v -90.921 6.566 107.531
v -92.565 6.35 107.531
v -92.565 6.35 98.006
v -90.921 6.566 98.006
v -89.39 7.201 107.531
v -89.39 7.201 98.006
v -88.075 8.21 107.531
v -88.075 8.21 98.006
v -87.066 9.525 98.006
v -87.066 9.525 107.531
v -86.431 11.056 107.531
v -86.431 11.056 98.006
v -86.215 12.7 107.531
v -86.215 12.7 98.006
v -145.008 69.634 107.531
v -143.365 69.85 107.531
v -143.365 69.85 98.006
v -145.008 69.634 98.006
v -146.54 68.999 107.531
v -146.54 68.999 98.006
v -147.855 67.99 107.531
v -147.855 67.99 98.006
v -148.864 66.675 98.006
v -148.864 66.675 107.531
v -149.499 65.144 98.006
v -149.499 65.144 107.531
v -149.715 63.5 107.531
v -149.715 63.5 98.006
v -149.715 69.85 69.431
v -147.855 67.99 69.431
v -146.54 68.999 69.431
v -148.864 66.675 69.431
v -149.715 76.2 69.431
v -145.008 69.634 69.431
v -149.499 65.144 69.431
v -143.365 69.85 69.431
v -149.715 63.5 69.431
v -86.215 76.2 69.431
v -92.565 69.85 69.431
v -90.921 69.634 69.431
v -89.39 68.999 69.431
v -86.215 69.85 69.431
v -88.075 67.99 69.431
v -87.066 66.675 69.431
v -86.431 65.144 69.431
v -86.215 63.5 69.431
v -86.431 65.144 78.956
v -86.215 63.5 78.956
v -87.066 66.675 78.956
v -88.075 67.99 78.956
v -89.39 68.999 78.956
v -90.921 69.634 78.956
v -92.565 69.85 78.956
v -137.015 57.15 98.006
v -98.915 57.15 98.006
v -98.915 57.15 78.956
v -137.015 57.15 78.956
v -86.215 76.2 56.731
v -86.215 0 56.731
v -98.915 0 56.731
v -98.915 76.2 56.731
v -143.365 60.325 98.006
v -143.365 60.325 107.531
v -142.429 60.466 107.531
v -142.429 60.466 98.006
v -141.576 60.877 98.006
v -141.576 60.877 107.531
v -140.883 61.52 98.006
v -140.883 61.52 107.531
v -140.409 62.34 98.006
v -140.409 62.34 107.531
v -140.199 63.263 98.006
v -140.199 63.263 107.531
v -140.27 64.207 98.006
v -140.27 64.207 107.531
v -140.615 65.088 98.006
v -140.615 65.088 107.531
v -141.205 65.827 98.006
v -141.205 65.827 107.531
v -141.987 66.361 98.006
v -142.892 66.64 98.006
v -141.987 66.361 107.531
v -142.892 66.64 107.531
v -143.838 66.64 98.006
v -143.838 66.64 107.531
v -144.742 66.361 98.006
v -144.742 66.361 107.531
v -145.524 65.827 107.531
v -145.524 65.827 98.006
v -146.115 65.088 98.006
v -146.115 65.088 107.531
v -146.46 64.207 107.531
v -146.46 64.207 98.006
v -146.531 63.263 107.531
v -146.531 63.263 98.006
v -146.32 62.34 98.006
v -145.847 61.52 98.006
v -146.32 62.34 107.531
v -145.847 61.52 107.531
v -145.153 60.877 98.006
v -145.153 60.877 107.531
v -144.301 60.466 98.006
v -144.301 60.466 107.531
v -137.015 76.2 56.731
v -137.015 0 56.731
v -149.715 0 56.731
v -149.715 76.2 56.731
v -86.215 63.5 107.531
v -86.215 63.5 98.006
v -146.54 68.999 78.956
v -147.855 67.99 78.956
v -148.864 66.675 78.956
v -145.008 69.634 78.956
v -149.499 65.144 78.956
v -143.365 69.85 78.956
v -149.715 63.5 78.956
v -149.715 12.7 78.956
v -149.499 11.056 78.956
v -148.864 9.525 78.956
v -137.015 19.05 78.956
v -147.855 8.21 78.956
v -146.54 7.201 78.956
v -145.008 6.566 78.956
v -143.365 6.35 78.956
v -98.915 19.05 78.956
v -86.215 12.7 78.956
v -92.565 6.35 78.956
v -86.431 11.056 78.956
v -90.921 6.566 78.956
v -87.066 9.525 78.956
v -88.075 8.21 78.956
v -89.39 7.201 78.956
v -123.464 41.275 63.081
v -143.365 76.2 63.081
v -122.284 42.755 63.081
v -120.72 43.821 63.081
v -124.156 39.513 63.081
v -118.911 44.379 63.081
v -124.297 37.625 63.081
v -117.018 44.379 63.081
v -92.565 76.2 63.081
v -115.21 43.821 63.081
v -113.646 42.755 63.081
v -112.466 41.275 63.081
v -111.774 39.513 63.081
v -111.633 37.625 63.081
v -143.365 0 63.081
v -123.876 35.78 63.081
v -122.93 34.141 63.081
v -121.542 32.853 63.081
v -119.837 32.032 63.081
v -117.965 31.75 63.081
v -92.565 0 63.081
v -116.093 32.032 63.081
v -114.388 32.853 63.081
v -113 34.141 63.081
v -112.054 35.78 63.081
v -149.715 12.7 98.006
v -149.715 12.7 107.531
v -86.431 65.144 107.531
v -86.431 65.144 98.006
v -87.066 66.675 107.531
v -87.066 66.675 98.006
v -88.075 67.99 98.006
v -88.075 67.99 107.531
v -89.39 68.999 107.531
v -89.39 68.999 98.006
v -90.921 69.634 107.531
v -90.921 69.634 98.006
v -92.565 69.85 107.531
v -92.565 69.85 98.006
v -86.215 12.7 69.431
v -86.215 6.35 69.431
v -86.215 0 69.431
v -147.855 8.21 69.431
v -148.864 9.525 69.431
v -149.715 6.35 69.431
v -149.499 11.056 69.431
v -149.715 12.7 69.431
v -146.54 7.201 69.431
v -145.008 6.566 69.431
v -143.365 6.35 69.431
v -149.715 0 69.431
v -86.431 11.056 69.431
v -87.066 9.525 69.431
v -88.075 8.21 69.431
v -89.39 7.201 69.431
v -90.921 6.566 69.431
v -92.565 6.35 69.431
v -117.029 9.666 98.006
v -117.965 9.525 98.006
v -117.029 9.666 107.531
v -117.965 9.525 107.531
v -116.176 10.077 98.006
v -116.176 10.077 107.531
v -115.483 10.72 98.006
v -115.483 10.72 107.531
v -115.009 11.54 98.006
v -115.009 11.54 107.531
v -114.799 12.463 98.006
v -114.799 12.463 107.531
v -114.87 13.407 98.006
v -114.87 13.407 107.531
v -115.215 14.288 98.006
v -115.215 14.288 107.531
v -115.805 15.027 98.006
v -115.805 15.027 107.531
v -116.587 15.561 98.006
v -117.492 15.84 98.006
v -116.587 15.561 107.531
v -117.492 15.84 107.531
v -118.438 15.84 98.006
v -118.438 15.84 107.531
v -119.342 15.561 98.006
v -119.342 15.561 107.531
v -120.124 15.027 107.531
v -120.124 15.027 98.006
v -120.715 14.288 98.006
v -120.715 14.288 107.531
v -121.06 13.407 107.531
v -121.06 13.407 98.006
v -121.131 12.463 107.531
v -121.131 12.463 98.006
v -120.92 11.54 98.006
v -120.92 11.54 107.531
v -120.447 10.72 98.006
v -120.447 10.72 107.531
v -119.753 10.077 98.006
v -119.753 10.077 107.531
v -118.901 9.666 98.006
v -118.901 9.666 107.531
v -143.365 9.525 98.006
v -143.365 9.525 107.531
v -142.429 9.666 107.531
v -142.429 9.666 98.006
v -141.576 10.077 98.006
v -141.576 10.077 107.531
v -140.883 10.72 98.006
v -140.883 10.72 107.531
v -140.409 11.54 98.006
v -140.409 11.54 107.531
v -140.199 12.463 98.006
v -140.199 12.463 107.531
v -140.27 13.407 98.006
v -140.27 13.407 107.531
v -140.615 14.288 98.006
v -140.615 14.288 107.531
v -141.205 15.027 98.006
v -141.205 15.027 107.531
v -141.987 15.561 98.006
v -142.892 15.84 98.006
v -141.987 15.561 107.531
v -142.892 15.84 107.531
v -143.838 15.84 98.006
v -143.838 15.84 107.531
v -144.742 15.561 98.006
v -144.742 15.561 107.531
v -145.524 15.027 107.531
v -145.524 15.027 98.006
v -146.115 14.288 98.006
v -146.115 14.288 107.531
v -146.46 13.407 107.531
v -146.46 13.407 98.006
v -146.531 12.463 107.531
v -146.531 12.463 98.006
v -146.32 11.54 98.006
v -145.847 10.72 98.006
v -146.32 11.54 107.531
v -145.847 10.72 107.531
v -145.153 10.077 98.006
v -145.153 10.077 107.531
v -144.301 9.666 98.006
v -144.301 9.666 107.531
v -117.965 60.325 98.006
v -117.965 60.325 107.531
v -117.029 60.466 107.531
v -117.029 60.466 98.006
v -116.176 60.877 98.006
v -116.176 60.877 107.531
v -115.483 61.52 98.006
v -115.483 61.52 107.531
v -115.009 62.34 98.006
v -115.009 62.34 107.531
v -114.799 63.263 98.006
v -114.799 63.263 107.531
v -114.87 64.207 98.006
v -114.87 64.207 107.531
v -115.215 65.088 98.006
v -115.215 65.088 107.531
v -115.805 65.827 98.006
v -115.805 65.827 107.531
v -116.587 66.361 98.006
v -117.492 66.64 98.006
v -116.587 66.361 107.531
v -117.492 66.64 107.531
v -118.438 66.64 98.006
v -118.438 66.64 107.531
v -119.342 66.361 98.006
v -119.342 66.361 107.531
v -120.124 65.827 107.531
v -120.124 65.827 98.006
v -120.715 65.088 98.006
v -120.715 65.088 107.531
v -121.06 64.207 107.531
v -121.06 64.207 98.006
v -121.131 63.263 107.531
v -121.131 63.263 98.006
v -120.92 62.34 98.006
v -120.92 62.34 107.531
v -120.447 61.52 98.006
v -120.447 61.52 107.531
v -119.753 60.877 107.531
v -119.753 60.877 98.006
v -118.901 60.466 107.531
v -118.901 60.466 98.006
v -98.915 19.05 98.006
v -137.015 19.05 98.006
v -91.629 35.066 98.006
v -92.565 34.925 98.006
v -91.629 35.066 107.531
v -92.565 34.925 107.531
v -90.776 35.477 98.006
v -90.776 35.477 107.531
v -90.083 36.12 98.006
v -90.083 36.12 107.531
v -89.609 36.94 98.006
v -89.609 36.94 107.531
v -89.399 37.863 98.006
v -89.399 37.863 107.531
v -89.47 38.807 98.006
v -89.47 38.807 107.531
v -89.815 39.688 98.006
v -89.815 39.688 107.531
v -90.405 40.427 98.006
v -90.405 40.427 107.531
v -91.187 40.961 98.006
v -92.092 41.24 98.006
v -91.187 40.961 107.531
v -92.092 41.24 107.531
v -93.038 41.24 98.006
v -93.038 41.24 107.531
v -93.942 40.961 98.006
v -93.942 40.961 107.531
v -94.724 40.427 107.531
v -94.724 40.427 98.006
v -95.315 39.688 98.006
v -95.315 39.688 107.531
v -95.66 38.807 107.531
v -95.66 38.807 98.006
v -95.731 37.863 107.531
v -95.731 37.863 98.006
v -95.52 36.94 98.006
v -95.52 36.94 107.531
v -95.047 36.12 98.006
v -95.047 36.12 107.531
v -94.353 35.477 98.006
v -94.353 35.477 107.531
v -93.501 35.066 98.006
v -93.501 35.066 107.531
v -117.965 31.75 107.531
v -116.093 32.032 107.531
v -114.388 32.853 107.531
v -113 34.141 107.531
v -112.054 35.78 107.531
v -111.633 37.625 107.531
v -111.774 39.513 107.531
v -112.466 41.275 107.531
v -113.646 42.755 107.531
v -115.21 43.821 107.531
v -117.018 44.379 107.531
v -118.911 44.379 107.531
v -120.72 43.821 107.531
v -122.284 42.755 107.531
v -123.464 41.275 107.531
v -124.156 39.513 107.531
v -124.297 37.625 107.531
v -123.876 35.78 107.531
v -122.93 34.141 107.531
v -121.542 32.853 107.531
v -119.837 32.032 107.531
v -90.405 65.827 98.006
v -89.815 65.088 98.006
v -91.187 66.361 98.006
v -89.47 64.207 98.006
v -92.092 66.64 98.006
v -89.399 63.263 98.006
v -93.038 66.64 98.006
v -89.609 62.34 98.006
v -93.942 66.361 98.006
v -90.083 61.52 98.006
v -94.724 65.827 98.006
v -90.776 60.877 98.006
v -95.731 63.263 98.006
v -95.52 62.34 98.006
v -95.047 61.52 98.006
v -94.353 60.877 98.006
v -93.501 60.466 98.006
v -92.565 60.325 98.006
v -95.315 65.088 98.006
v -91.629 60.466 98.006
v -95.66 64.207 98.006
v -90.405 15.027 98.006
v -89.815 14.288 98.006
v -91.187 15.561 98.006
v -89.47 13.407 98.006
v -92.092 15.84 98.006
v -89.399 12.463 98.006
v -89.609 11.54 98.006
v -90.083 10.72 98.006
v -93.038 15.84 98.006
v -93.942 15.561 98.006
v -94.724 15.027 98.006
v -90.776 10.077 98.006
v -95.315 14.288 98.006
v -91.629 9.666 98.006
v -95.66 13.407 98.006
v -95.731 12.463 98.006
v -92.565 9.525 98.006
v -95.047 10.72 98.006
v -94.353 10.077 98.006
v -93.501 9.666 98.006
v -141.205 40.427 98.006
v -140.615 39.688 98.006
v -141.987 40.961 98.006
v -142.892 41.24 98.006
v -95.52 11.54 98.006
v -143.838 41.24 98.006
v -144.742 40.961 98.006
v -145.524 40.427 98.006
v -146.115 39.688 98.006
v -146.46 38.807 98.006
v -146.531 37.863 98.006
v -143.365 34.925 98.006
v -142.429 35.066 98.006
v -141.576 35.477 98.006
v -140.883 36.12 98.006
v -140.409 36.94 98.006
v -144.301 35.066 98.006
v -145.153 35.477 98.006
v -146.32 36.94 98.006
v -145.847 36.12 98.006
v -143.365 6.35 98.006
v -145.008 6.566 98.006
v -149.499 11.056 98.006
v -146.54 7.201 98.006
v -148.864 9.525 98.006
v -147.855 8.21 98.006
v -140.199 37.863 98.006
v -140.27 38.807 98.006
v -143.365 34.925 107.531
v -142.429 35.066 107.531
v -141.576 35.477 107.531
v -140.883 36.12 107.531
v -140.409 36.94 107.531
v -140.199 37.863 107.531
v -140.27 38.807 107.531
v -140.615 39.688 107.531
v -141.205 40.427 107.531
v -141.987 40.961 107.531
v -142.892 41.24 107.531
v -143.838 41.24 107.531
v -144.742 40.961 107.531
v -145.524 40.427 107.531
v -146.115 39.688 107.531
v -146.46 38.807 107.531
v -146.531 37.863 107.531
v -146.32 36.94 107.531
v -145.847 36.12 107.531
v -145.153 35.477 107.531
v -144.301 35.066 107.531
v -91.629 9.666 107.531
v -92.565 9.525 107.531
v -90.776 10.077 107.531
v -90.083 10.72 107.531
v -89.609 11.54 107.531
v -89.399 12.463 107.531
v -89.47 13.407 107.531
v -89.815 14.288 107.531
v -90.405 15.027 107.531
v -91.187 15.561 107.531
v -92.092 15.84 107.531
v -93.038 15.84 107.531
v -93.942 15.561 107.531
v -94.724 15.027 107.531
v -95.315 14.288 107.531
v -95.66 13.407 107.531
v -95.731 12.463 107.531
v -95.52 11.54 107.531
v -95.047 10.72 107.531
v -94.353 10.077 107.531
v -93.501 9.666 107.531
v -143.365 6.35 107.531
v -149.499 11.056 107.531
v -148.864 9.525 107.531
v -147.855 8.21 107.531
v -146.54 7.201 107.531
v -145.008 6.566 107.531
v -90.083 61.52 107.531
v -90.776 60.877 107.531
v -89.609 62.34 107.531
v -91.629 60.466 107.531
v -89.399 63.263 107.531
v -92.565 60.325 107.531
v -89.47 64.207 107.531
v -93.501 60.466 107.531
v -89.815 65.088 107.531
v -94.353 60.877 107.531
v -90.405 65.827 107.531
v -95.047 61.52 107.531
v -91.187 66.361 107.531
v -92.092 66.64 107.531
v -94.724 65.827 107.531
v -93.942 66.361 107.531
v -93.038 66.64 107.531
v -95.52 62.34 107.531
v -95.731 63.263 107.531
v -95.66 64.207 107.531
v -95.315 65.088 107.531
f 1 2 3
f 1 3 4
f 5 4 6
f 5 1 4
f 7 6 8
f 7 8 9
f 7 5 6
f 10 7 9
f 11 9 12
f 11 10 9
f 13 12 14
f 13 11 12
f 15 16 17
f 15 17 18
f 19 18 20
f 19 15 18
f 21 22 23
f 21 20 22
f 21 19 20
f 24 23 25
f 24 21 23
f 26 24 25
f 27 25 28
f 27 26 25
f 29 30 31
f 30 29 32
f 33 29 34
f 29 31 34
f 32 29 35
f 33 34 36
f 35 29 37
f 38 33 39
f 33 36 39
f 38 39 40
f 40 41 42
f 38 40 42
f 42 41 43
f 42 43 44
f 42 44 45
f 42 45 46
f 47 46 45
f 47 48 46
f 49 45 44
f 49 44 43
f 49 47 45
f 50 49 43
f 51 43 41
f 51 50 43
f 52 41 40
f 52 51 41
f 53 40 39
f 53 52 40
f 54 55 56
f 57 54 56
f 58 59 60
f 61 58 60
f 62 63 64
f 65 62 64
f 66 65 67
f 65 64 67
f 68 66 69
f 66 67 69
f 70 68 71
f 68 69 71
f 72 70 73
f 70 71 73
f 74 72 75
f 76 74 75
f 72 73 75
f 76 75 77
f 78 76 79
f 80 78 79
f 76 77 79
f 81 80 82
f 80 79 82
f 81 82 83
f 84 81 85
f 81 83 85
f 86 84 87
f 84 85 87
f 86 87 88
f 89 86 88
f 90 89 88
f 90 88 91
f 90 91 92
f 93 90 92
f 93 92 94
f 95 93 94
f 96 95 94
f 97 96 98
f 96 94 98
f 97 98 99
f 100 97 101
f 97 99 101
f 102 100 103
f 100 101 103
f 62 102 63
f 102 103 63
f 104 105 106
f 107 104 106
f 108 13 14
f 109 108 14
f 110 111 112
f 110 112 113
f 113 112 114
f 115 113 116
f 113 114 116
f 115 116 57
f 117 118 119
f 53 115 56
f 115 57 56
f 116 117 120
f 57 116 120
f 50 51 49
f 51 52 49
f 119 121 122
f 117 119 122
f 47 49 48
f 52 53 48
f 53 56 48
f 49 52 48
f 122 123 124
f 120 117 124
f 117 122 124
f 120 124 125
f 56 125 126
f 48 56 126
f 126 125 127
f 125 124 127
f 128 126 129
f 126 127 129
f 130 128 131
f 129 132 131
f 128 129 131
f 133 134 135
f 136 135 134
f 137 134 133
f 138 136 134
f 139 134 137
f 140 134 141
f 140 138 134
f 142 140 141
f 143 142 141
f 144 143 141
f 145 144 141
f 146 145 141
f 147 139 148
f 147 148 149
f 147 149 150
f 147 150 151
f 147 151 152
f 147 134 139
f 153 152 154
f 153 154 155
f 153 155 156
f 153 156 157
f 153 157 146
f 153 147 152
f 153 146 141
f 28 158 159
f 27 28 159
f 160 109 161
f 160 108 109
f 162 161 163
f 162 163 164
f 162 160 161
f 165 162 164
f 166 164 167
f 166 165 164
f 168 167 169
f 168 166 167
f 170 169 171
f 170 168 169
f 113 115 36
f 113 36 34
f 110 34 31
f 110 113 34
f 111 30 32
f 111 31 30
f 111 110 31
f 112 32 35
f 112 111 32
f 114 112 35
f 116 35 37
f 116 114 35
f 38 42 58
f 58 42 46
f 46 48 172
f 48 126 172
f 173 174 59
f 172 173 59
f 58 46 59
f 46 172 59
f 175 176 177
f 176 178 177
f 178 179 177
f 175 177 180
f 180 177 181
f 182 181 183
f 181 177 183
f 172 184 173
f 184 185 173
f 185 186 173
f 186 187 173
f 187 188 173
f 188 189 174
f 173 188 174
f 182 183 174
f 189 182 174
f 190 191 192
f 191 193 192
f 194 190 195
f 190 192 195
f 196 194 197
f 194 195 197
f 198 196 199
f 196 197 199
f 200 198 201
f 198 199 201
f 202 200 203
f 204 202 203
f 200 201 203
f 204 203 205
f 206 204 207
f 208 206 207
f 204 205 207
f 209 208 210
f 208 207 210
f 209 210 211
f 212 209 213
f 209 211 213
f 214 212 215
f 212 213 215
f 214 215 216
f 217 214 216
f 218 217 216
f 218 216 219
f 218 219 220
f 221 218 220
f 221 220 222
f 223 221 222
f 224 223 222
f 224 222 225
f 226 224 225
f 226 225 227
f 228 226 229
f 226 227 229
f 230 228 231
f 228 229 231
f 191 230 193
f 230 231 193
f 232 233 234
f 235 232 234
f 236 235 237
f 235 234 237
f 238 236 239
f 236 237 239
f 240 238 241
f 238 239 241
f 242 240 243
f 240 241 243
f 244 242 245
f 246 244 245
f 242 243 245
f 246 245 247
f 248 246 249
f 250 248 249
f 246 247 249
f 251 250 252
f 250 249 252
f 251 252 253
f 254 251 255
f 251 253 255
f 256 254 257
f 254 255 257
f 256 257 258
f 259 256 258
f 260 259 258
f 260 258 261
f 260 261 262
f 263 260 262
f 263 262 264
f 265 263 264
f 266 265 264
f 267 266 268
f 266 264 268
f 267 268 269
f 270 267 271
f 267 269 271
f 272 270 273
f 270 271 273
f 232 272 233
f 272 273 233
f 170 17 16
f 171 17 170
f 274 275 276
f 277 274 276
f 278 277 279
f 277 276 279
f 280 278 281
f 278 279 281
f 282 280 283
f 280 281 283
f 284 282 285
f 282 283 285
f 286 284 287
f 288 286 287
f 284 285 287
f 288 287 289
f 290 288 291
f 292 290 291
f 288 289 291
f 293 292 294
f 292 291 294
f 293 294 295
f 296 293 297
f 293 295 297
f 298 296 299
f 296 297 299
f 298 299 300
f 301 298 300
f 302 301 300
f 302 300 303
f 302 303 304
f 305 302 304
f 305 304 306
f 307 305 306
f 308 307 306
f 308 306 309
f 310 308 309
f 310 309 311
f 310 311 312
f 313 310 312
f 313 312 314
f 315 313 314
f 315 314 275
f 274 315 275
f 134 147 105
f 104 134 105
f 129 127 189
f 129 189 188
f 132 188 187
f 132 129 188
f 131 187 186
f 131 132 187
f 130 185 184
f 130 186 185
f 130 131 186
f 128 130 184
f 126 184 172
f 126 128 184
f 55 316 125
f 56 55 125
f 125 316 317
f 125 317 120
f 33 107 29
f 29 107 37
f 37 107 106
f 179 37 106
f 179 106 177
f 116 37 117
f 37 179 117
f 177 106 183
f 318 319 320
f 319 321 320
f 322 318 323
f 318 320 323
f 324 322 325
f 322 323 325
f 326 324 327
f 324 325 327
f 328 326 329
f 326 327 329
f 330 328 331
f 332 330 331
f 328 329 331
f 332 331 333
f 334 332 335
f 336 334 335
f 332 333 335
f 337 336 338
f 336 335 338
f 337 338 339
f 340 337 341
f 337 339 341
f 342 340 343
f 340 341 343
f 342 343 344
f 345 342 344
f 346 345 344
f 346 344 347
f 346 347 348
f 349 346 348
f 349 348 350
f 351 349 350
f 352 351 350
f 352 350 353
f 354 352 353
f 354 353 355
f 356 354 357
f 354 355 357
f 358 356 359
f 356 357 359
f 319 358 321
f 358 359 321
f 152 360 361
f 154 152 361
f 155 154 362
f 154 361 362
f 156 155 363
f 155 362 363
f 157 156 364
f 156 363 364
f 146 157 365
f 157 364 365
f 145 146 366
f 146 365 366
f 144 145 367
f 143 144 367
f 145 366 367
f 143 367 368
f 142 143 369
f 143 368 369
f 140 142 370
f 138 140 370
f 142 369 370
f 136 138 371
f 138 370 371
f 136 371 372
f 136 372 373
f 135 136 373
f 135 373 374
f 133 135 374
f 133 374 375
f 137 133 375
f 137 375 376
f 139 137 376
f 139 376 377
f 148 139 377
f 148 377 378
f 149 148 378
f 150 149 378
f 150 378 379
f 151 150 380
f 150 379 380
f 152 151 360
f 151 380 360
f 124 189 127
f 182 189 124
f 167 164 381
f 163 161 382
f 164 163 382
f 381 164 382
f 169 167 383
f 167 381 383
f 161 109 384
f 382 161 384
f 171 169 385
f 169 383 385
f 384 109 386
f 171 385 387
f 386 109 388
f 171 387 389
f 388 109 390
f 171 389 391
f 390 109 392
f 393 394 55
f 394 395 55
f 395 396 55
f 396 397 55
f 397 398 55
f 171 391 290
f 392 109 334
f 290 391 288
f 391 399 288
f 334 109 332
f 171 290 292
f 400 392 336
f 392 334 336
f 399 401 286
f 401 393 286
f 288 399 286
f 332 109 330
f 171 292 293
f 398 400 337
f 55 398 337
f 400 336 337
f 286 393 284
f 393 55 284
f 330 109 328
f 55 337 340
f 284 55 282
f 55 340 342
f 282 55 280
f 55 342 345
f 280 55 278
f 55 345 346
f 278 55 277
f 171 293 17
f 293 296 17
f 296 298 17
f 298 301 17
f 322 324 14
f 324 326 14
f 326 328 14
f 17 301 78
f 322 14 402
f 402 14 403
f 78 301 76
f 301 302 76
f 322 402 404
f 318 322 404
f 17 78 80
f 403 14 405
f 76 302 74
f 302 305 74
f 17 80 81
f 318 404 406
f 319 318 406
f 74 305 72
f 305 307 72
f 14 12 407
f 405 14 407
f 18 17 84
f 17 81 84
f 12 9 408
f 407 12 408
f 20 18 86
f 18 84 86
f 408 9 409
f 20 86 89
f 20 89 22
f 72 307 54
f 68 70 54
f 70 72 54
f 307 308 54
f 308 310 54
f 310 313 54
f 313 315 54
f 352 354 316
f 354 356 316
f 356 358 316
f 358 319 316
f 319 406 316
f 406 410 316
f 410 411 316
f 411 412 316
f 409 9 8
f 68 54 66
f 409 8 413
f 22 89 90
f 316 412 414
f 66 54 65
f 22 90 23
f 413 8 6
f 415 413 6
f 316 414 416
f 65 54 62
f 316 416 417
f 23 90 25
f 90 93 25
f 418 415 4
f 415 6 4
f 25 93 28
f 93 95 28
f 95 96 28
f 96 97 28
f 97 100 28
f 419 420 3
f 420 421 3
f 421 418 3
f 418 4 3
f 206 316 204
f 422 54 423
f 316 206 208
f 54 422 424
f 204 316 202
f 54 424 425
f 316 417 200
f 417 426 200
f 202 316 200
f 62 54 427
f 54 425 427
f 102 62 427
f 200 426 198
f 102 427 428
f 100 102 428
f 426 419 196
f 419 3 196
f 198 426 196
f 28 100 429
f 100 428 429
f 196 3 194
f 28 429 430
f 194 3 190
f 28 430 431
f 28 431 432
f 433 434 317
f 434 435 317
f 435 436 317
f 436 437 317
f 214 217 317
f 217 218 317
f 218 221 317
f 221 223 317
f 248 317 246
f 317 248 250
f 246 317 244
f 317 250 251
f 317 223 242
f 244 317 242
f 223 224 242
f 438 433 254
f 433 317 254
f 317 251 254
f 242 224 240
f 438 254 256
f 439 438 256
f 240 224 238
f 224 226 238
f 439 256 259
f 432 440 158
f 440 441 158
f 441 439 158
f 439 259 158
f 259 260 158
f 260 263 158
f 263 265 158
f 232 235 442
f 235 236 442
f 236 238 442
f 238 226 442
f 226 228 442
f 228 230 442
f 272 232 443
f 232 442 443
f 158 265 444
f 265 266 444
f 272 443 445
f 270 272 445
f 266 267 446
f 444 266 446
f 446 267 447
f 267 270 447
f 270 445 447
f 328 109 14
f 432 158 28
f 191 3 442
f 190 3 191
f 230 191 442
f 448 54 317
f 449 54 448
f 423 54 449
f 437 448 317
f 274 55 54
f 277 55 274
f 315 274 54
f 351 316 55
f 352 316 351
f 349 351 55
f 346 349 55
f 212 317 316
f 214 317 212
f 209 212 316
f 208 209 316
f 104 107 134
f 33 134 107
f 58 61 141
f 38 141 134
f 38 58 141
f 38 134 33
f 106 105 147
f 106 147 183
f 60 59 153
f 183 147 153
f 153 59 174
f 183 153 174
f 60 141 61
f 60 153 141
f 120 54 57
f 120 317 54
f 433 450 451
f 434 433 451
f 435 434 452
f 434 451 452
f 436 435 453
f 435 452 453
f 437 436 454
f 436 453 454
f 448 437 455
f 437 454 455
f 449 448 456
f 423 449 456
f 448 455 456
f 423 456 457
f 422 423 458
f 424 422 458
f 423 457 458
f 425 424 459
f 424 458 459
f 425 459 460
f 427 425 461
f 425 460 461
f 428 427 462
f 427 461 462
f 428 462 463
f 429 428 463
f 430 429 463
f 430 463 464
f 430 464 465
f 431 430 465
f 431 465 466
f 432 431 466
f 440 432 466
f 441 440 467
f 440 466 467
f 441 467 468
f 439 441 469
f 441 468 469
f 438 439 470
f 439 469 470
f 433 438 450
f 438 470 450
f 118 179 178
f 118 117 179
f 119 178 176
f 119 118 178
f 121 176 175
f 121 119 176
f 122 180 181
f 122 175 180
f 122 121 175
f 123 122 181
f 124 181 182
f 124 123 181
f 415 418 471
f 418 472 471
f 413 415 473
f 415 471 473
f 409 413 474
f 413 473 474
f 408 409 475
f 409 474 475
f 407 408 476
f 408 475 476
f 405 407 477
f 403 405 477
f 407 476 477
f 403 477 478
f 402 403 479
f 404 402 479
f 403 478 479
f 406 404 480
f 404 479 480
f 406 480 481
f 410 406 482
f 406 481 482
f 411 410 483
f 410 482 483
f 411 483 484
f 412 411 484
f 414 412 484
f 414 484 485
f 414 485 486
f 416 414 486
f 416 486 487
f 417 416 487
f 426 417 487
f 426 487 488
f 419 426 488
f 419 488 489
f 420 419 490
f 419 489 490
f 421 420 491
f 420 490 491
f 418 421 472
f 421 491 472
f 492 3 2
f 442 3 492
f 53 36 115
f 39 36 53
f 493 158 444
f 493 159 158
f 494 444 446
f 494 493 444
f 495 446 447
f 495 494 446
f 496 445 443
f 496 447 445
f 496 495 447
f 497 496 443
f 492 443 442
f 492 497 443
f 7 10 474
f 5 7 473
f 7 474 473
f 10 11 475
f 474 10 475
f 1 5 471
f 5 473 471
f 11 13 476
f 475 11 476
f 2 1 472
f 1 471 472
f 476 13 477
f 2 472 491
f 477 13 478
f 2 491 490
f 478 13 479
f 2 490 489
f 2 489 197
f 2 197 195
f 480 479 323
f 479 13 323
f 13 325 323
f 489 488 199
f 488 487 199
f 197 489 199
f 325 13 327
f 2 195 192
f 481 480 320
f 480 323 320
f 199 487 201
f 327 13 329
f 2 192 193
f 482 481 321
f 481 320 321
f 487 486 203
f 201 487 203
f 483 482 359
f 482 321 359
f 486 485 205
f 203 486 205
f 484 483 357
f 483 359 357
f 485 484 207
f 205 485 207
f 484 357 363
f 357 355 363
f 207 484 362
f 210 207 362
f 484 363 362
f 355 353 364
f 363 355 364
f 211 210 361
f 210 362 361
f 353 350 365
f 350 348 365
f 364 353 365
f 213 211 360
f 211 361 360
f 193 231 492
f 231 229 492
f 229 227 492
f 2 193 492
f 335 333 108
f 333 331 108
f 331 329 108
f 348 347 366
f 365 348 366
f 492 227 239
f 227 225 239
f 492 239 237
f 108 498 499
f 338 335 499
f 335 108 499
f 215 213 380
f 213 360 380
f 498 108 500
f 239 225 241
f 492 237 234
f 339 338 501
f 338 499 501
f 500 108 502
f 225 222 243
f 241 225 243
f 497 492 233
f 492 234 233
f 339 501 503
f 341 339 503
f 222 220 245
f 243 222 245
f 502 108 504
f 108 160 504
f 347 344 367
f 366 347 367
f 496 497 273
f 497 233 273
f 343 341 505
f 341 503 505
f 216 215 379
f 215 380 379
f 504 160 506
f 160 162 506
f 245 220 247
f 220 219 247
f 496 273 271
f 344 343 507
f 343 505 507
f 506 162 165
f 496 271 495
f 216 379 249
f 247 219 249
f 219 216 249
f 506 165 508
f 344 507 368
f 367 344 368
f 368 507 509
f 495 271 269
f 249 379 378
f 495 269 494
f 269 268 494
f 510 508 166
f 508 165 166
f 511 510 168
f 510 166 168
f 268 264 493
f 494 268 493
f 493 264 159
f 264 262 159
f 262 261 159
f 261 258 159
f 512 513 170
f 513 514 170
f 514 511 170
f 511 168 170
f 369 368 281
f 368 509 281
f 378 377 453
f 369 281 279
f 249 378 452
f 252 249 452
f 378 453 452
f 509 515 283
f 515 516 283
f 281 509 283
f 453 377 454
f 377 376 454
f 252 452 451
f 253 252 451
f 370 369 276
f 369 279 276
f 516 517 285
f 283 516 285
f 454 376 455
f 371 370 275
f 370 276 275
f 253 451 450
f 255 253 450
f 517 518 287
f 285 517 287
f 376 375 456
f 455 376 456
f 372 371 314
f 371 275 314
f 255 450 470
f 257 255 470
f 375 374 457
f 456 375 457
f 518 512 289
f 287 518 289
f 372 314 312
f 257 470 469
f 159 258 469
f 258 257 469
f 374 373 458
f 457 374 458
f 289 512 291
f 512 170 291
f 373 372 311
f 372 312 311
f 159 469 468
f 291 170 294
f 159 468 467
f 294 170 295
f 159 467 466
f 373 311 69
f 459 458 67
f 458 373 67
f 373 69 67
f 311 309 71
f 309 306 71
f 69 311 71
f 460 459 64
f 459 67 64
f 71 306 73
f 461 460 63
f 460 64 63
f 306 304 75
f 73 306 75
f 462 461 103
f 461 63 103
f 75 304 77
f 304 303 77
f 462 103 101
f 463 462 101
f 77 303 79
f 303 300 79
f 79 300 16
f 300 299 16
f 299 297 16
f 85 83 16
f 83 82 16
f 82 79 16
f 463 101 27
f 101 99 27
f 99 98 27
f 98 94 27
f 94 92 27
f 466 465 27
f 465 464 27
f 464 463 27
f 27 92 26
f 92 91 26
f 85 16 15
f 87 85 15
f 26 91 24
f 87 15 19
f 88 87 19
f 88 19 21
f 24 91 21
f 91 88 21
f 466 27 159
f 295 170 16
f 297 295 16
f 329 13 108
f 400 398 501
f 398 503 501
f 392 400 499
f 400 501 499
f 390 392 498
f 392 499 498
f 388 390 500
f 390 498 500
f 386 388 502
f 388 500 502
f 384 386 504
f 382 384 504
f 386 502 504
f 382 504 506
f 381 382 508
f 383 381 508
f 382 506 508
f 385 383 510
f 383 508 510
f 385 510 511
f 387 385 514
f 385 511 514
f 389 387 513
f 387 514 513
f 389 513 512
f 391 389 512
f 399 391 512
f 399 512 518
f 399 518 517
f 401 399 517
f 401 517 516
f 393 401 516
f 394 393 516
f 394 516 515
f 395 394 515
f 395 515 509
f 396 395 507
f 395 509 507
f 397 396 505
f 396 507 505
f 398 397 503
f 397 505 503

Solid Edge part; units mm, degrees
sketch "Sketch1" plane through (0, 0, 0) normal (0, -1, 0) x (1, 0, 0)
  line L0 (-149.7149, 69.4306) -> (-86.2149, 69.4306)
  line L1 (-86.2149, 69.4306) -> (-86.2149, 56.7306)
  line L2 (-86.2149, 56.7306) -> (-98.9149, 56.7306)
  line L3 (-92.5649, 63.0806) -> (-98.9149, 56.7306)
  line L4 (-143.3649, 63.0806) -> (-92.5649, 63.0806)
  line L5 (-143.3649, 63.0806) -> (-137.0149, 56.7306)
  line L6 (-137.0149, 56.7306) -> (-149.7149, 56.7306)
  line L7 (-149.7149, 56.7306) -> (-149.7149, 69.4306)
extrude "Protrusion1" add sketch "Sketch1" against normal blind 76.2
sketch "Sketch2" plane through (-117.9649, 38.1, 69.4306) normal (0, 0, 1) x (1, 0, 0)
  line L0 (31.75, -31.75) -> (-31.75, -31.75)
  line L1 (-31.75, -31.75) -> (-31.75, 31.75)
  line L2 (-31.75, 31.75) -> (31.75, 31.75)
  line L3 (31.75, 31.75) -> (31.75, -31.75)
extrude "ExtrudedProtrusion_2" add sketch "Sketch2" along normal blind 38.1
sketch "Sketch3" plane through (-117.9649, 6.35, 88.4806) normal (0, -1, 0) x (1, 0, 0)
  line L0 (-31.75, -9.525) -> (-19.05, -9.525)
  line L1 (-19.05, 9.525) -> (-19.05, -9.525)
  line L2 (-31.75, 9.525) -> (-19.05, 9.525)
extrude "Cutout1" cut sketch "Sketch3" against normal through all material side at (-143.3649, 6.35, 79.0056)
sketch "Sketch4" plane through (-117.9649, 6.35, 88.4806) normal (0, -1, 0) x (1, 0, 0)
  line L0 (19.05, -9.525) -> (31.75, -9.525)
  line L1 (19.05, 9.525) -> (19.05, -9.525)
  line L2 (31.75, 9.525) -> (19.05, 9.525)
extrude "Cutout2" cut sketch "Sketch4" against normal through all material side at (-92.5649, 6.35, 79.0056)
sketch "Sketch5" plane through (-98.9149, 38.1, 88.4806) normal (1, 0, 0) x (0, 0, -1)
  line L0 (-9.525, 19.05) -> (9.525, 19.05)
  line L1 (9.525, 19.05) -> (9.525, 31.75)
  line L2 (9.525, 31.75) -> (-9.525, 31.75)
  line L3 (-9.525, 31.75) -> (-9.525, 19.05)
  line L4 (-9.525, -19.05) -> (9.525, -19.05)
  line L5 (9.525, -19.05) -> (9.525, -31.75)
  line L6 (9.525, -31.75) -> (-9.525, -31.75)
  line L7 (-9.525, -31.75) -> (-9.525, -19.05)
extrude "Cutout3" cut sketch "Sketch5" against normal through all
hole "Hole_2" at (-92.5649, 63.5, 107.5306) direction (0, 0, -1) diameter 6.35 end up to next
hole "Hole_11" at (-117.9649, 63.5, 107.5306) direction (0, 0, -1) diameter 6.35 end up to next
hole "Hole1" at (-143.3649, 63.5, 107.5306) direction (0, 0, -1) diameter 6.35 end up to next
hole "Hole2" at (-143.3649, 38.1, 107.5306) direction (0, 0, -1) diameter 6.35 end up to next
hole "Hole3" at (-143.3649, 12.7, 107.5306) direction (0, 0, -1) diameter 6.35 end up to next
hole "Hole4" at (-117.9649, 12.7, 107.5306) direction (0, 0, -1) diameter 6.35 end up to next
hole "Hole5" at (-92.5649, 12.7, 107.5306) direction (0, 0, -1) diameter 6.35 end up to next
hole "Hole6" at (-92.5649, 38.1, 107.5306) direction (0, 0, -1) diameter 6.35 end up to next
hole "Hole_18" at (-117.9649, 38.1, 107.5306) direction (0, 0, -1) diameter 12.7 end up to next
fillet "Round_1" radius 6.35 8 edges at (-149.7149, 69.85, 74.1931) (-149.7149, 6.35, 74.1931) (-86.2149, 69.85, 74.1931) (-86.2149, 6.35, 74.1931) (-149.7149, 6.35, 102.7681) (-149.7149, 69.85, 102.7681) (-86.2149, 6.35, 102.7681) (-86.2149, 69.85, 102.7681)
